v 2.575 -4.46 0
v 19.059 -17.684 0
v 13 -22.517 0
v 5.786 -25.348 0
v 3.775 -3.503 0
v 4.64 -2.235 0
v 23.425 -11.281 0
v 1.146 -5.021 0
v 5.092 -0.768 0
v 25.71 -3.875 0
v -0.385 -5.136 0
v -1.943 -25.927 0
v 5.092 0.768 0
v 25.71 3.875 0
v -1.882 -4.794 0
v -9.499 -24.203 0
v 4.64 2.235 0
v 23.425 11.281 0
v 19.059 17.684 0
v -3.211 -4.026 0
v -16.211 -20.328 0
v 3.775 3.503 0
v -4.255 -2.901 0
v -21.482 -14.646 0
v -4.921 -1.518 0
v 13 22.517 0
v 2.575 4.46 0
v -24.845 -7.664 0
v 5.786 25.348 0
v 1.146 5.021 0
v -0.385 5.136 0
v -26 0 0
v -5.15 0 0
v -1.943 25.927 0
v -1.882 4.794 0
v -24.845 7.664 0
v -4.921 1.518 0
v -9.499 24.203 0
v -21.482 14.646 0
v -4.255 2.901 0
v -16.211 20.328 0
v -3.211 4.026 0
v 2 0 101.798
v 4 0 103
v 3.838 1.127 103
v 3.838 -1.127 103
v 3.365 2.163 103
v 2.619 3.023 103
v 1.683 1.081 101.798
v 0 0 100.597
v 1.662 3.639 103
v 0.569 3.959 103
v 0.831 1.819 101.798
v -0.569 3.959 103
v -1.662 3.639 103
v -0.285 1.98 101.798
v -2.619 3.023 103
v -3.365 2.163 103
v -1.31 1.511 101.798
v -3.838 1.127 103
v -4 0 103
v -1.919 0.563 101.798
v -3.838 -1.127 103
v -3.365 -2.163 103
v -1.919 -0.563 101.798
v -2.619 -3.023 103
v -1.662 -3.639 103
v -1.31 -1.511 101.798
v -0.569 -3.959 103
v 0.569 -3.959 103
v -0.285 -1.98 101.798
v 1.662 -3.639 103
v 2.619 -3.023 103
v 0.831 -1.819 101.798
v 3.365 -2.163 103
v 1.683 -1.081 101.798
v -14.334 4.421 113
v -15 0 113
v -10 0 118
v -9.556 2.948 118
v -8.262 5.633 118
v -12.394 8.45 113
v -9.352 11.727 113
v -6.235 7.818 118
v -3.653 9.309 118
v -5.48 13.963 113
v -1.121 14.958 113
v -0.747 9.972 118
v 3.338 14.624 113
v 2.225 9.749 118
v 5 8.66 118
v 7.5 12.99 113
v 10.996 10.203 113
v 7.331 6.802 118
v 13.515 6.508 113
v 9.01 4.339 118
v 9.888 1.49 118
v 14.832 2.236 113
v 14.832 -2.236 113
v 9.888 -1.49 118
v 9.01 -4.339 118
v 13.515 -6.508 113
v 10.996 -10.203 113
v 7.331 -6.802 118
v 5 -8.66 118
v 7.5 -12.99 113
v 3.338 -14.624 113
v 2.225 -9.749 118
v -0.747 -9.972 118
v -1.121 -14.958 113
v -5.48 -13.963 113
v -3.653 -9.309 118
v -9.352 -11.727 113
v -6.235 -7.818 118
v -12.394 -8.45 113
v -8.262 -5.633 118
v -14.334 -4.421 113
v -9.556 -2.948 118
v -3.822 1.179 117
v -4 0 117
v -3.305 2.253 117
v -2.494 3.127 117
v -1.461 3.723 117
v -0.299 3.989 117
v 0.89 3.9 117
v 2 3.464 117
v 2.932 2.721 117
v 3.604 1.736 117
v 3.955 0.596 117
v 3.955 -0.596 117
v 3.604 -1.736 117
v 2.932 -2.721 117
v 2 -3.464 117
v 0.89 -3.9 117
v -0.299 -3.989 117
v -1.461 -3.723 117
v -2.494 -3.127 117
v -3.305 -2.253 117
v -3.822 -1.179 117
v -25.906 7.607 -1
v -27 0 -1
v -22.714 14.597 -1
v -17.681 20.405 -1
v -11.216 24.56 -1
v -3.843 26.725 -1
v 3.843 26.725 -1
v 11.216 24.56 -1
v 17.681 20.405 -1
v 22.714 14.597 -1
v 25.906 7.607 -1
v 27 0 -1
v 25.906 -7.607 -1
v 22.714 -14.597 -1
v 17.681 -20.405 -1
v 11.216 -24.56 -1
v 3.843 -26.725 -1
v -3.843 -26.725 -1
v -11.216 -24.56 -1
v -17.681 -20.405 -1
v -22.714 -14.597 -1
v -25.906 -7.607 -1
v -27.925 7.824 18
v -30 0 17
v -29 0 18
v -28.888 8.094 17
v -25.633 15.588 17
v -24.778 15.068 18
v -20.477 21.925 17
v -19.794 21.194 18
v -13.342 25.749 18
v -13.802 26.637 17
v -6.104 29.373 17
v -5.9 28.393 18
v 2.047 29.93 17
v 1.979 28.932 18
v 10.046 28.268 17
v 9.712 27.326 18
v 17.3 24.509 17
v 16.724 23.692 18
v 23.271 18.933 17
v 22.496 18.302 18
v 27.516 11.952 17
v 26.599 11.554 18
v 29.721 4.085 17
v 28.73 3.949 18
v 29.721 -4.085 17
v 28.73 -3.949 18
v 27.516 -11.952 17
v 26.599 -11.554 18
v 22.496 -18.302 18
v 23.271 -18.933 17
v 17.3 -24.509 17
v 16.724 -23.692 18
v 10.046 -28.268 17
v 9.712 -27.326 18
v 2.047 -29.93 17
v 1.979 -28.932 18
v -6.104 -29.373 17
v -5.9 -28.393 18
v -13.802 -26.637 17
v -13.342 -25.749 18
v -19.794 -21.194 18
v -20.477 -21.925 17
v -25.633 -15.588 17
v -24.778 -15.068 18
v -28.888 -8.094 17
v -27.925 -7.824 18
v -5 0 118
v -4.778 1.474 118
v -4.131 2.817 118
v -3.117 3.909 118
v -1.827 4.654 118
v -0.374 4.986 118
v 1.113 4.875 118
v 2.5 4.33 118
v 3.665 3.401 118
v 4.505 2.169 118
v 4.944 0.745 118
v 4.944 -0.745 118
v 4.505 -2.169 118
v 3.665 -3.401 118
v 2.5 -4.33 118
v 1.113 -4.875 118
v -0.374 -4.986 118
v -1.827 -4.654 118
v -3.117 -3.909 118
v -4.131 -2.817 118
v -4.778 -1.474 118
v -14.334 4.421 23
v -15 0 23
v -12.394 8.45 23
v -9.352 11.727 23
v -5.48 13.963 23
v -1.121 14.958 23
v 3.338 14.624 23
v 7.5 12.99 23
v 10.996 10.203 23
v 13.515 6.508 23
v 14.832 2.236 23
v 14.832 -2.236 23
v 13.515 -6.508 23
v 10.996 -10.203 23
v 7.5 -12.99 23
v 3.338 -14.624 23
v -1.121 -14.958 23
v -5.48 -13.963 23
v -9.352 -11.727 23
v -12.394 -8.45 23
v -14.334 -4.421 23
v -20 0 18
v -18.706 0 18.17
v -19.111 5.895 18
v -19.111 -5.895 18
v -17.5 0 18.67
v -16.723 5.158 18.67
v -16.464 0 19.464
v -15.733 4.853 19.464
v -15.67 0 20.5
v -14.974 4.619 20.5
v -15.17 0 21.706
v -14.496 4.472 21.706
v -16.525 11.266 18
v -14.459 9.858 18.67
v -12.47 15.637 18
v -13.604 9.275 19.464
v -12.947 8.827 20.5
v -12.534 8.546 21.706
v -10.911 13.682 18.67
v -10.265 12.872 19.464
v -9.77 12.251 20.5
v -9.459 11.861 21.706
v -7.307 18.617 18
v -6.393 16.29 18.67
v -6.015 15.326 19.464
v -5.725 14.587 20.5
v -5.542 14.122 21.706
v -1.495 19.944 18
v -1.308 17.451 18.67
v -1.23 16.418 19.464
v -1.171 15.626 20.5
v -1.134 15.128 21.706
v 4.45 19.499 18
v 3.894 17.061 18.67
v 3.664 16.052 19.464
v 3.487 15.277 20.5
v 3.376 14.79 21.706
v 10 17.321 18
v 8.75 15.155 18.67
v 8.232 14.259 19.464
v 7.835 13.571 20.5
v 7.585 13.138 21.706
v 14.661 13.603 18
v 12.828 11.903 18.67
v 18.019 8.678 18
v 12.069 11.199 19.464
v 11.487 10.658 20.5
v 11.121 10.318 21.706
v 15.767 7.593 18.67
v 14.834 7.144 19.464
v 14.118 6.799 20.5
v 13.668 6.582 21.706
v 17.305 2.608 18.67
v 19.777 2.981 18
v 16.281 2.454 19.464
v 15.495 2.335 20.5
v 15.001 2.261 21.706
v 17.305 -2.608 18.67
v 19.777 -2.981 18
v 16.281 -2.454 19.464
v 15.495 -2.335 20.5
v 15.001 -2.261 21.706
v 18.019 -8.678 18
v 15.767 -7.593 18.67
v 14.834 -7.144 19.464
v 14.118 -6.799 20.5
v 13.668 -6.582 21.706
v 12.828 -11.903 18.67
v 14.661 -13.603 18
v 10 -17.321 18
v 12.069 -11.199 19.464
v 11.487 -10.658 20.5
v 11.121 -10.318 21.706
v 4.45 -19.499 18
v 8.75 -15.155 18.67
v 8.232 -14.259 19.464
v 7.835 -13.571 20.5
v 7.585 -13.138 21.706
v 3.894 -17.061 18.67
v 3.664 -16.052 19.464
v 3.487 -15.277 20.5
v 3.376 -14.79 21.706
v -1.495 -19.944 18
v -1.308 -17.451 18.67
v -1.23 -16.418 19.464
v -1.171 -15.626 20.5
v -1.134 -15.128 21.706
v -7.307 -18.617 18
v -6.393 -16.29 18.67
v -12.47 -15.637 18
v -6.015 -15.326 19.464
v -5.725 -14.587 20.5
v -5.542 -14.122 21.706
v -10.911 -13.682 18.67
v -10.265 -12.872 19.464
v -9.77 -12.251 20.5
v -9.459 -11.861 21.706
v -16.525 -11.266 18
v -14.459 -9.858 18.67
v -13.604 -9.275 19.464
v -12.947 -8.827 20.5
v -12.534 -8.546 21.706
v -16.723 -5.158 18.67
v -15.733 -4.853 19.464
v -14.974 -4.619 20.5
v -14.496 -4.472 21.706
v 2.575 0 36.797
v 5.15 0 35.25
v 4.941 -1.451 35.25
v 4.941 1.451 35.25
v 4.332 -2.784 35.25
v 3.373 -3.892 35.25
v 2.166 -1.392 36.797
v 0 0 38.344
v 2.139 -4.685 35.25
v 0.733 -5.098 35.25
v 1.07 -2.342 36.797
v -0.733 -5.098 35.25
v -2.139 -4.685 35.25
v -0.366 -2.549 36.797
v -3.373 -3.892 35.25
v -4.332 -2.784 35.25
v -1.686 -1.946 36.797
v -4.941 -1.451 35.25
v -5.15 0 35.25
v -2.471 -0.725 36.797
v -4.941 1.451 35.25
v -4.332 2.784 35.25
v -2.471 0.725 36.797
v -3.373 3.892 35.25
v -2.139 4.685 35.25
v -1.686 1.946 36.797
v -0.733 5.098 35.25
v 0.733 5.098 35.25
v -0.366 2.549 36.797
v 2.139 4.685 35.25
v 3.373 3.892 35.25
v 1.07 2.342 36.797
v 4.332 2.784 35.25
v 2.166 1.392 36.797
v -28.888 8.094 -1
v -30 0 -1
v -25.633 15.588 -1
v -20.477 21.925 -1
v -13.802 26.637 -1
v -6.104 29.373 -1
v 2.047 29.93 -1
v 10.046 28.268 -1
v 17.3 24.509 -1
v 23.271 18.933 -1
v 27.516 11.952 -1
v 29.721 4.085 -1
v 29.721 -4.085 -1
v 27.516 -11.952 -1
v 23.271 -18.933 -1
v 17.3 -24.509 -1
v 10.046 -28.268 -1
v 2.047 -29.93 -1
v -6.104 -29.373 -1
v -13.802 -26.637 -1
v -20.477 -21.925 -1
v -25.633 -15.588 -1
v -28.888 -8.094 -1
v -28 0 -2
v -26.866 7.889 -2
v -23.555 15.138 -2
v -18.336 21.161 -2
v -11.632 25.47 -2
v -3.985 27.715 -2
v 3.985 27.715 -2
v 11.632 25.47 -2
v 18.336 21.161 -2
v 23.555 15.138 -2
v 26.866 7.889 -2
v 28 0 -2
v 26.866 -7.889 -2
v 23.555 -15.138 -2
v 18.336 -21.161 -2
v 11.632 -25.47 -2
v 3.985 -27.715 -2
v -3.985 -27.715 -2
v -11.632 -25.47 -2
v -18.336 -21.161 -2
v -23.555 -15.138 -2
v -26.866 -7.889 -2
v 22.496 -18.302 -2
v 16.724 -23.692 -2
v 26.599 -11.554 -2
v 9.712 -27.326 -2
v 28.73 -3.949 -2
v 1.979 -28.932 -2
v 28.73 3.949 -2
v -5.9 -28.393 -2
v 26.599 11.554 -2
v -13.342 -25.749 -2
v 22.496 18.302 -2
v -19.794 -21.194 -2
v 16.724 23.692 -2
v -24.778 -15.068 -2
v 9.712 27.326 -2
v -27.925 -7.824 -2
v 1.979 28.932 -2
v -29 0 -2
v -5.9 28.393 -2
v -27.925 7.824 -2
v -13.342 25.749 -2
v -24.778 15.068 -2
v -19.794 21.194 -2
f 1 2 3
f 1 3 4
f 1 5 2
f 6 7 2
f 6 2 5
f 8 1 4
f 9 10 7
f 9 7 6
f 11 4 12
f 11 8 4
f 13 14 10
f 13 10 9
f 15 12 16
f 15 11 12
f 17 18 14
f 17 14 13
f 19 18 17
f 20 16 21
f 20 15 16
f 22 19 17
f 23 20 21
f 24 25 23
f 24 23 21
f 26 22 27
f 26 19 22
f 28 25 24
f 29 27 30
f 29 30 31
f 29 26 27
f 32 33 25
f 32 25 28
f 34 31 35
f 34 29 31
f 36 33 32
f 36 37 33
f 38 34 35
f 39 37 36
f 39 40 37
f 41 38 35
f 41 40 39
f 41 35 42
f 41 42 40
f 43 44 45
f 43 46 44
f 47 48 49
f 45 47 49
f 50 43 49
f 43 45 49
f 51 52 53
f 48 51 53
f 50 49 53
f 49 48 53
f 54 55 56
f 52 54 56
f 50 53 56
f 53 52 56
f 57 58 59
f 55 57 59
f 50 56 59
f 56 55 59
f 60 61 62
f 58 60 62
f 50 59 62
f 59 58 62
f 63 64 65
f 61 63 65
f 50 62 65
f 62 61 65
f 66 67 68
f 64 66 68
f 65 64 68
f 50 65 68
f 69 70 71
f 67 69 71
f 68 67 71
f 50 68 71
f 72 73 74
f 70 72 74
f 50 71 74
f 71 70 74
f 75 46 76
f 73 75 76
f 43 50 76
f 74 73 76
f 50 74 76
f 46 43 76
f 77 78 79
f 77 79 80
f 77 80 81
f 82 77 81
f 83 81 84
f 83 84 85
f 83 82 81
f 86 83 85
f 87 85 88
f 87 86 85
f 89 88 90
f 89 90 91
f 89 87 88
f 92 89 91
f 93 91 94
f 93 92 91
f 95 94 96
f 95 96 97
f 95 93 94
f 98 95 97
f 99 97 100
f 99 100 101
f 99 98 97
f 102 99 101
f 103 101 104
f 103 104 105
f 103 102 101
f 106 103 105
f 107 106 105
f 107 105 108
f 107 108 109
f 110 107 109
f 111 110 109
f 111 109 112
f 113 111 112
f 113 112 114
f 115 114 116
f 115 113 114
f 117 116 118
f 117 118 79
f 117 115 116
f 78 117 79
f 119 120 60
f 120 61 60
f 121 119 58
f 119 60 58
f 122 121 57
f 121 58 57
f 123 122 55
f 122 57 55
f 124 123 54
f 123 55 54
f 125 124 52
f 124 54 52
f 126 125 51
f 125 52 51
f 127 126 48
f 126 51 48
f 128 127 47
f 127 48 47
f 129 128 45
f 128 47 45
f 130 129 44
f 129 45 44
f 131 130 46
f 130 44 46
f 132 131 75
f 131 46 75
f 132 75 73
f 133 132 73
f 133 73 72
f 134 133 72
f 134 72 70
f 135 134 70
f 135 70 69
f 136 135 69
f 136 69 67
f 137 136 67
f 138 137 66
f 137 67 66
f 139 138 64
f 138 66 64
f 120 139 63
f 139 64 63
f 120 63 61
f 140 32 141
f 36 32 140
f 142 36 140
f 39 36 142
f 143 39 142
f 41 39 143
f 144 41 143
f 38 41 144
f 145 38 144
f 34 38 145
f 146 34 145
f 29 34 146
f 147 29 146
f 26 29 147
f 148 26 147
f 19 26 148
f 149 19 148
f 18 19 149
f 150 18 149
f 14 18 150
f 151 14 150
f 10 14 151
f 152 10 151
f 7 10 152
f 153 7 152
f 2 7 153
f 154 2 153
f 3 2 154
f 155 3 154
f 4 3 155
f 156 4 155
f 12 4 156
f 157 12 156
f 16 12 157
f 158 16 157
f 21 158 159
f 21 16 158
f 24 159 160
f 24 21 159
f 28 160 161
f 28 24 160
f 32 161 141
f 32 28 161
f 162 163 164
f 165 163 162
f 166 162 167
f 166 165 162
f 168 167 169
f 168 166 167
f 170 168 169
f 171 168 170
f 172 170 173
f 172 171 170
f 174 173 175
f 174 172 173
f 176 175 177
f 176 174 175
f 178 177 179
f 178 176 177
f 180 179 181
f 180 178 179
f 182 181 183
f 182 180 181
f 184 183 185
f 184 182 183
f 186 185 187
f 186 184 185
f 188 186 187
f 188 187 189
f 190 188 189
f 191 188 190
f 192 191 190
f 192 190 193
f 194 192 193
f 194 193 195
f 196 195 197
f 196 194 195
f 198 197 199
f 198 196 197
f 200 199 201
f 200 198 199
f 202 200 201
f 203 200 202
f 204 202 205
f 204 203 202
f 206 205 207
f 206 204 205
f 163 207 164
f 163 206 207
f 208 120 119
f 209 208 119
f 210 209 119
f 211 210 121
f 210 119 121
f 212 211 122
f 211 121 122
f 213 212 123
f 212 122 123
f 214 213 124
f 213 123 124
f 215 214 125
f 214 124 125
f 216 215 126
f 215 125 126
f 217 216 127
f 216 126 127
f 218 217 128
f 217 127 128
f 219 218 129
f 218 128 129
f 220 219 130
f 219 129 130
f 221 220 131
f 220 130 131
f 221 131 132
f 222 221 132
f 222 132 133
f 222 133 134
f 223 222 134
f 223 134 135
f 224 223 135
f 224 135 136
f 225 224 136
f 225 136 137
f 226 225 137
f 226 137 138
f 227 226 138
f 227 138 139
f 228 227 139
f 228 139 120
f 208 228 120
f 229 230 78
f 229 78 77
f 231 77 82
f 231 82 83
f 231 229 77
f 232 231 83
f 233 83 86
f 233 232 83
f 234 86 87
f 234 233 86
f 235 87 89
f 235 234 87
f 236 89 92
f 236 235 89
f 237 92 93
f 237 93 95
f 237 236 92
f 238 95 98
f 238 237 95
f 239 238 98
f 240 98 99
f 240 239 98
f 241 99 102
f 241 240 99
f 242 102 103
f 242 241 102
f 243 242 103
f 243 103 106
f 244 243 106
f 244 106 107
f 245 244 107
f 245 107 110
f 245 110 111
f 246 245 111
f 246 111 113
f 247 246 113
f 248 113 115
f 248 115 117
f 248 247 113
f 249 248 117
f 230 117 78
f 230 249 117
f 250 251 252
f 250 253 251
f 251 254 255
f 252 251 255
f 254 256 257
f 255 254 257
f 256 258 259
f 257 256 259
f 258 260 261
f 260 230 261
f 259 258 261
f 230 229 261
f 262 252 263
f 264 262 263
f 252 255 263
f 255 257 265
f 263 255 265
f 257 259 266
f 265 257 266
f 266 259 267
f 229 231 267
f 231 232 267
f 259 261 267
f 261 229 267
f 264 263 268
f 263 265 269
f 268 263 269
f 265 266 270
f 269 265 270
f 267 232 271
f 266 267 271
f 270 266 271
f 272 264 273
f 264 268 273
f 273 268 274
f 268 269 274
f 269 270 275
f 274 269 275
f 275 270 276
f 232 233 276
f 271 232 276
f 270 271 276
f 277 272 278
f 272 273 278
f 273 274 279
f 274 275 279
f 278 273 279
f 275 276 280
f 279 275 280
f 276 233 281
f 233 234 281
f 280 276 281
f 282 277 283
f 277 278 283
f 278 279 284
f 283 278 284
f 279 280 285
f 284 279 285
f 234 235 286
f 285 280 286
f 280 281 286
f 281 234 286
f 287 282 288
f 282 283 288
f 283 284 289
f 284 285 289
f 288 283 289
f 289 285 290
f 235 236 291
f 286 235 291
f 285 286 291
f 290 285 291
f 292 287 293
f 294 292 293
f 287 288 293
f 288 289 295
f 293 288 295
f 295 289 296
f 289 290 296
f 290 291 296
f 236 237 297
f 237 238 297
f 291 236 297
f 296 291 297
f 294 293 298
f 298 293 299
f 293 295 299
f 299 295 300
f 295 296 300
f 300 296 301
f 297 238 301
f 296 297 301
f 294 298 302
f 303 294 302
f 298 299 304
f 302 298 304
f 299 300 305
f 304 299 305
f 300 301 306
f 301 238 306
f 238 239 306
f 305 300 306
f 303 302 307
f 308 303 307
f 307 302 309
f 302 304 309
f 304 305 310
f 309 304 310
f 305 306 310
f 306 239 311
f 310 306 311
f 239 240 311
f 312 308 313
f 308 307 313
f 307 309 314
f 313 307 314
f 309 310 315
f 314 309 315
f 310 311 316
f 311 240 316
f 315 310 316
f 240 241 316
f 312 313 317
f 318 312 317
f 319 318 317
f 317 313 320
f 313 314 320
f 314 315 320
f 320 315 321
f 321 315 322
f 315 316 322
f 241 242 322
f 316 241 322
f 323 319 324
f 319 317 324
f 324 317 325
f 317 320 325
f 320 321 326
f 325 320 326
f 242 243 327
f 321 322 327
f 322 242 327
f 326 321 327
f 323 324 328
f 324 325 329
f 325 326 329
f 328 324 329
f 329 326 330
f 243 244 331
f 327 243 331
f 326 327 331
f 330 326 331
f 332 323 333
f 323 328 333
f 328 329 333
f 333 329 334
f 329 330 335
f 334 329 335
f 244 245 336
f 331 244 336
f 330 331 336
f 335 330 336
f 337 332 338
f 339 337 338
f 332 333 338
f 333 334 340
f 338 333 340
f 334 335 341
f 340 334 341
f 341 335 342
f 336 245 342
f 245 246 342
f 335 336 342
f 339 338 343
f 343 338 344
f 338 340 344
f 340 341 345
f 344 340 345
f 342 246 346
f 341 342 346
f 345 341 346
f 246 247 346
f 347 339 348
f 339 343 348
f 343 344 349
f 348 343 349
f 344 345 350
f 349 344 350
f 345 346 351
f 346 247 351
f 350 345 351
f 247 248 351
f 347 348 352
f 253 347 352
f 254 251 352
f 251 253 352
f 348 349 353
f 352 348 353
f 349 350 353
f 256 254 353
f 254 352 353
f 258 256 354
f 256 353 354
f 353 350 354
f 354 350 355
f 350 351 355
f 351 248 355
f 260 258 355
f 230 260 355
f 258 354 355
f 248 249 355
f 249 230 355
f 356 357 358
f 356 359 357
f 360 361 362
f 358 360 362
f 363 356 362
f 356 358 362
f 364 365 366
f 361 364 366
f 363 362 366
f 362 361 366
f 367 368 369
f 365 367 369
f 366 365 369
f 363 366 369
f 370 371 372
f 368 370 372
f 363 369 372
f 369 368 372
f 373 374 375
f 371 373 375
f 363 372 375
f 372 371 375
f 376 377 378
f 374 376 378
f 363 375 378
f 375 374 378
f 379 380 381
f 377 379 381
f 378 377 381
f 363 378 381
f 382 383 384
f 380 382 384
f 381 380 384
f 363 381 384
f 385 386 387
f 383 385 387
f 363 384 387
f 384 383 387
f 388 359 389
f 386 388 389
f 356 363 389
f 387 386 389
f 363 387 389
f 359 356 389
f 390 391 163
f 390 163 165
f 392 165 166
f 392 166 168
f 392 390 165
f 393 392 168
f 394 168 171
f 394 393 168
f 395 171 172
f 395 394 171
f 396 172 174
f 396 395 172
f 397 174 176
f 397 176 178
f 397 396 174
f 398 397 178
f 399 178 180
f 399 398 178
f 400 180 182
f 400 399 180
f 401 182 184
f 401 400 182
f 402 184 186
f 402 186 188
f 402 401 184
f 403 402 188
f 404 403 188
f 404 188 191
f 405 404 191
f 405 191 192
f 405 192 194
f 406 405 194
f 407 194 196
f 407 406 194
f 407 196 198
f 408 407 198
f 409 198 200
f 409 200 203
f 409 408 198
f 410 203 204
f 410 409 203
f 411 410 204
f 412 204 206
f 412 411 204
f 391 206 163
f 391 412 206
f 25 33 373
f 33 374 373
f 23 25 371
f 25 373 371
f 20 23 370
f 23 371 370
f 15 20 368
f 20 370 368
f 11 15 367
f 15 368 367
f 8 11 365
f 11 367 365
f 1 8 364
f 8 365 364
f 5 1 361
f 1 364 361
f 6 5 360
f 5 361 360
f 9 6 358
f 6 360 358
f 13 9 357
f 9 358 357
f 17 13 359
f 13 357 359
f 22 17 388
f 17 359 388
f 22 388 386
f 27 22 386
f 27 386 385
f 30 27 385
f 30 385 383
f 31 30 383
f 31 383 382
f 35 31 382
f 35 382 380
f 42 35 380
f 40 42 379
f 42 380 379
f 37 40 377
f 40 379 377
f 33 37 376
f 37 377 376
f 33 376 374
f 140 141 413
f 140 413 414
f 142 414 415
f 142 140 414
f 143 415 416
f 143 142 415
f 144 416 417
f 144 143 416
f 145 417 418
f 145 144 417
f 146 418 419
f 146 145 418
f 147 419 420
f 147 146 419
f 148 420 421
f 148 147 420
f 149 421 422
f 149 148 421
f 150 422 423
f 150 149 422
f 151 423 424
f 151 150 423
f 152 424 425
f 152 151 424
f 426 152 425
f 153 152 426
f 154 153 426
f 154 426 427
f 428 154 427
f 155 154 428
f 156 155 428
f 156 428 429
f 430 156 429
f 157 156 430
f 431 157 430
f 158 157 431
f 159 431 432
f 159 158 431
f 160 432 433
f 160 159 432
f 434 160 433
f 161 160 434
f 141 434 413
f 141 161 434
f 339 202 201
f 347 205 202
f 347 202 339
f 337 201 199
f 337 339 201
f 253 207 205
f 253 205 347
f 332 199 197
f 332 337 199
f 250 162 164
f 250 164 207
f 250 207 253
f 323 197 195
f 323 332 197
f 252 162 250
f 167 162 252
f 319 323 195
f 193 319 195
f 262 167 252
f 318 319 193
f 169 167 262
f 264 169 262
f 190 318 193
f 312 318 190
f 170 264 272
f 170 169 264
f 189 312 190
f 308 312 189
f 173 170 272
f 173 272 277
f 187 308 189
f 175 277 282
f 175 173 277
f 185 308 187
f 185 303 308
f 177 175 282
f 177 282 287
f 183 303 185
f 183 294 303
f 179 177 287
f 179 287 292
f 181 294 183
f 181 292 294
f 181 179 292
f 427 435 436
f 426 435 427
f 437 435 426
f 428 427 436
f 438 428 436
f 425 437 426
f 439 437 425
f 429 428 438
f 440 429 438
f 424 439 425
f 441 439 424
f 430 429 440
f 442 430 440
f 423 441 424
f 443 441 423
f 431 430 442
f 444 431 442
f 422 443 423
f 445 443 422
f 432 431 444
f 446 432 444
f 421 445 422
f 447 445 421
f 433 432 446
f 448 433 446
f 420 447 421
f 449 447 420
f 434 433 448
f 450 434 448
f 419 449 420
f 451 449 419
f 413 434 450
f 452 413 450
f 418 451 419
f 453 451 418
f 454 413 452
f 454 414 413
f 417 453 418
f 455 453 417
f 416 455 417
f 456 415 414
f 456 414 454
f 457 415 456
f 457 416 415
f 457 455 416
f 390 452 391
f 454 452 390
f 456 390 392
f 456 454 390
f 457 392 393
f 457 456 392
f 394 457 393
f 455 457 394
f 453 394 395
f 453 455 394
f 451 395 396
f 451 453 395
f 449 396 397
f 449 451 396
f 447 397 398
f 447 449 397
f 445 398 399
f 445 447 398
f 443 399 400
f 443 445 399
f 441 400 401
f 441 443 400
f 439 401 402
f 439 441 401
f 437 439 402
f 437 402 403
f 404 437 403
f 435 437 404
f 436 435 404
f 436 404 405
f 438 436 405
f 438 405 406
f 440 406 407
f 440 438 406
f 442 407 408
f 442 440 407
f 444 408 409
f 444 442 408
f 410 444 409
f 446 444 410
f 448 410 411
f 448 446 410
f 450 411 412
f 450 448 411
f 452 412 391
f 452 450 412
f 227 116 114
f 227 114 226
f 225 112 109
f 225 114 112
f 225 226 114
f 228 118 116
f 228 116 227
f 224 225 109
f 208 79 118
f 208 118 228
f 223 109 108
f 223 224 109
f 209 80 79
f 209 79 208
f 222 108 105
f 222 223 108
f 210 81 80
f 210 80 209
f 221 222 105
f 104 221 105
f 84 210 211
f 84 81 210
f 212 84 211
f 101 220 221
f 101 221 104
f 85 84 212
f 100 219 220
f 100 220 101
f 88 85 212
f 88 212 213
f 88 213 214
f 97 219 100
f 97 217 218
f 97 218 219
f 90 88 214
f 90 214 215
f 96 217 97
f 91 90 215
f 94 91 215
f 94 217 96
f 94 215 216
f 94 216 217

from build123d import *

# Parameters (mm, degrees)
F2_SIZE        = 5
F3_SIZE        = 0.99999
F5_R           = 5
F6_D           = 10.3
F6_DEPTH       = 35.25
F6_TIP         = 3.094432188
F8_D           = 8
F8_DEPTH       = 15
F8_CSINK_D     = 10
F8_CSINK_ANGLE = 90
F8_TIP         = 2.4034424761


# Not quite as in the source:
# - a fillet or chamfer is up to 0.001 mm smaller than in the source, because OpenCascade refuses the exact size


with BuildPart() as f1:
    # F0 (on Front) → F1 (revolve)
    with BuildSketch(Plane.XZ):
        Polygon((-27, 0), (0, 0), (0, 118), (-15, 118), (-15, 18), (-30, 18), (-30, -2), (-27, -2), align=None)
    revolve(axis=Axis((0, 0, 59), (0, 0, -1)))

    # F2
    f2_edges = [f1.edges().sort_by_distance(p)[0] for p in [
        (15, 0, 118),
    ]]
    chamfer(f2_edges, length=F2_SIZE)

    # F3 (size 1 in the source; OpenCascade refuses exactly that, so slightly less here)
    f3_edges = [f1.edges().sort_by_distance(p)[0] for p in [
        (30, 0, 18),
        (30, 0, -2),
        (27, 0, -2),
        (27, 0, 0),
        (-27, 0, -1),
    ]]
    chamfer(f3_edges, length=F3_SIZE)

    # F5
    f5_edges = [f1.edges().sort_by_distance(p)[0] for p in [
        (15, 0, 18),
    ]]
    fillet(f5_edges, radius=F5_R)

    # F6
    with Locations(Plane(origin=(0, 0, 0), x_dir=(1, 0, 0), z_dir=(0, 0, -1))):
        with Locations((0, 0)):
            Hole(F6_D / 2, depth=F6_DEPTH)
            with Locations((0, 0, -(F6_DEPTH + F6_TIP / 2))):  # 118° drill point
                Cone(0, F6_D / 2, F6_TIP, mode=Mode.SUBTRACT)

    # F8
    with Locations(Plane.XY.offset(118)):
        with Locations((0, 0)):
            CounterSinkHole(F8_D / 2, F8_CSINK_D / 2, depth=F8_DEPTH, counter_sink_angle=F8_CSINK_ANGLE)
            with Locations((0, 0, -(F8_DEPTH + F8_TIP / 2))):  # 118° drill point
                Cone(0, F8_D / 2, F8_TIP, mode=Mode.SUBTRACT)


solid = f1.part
